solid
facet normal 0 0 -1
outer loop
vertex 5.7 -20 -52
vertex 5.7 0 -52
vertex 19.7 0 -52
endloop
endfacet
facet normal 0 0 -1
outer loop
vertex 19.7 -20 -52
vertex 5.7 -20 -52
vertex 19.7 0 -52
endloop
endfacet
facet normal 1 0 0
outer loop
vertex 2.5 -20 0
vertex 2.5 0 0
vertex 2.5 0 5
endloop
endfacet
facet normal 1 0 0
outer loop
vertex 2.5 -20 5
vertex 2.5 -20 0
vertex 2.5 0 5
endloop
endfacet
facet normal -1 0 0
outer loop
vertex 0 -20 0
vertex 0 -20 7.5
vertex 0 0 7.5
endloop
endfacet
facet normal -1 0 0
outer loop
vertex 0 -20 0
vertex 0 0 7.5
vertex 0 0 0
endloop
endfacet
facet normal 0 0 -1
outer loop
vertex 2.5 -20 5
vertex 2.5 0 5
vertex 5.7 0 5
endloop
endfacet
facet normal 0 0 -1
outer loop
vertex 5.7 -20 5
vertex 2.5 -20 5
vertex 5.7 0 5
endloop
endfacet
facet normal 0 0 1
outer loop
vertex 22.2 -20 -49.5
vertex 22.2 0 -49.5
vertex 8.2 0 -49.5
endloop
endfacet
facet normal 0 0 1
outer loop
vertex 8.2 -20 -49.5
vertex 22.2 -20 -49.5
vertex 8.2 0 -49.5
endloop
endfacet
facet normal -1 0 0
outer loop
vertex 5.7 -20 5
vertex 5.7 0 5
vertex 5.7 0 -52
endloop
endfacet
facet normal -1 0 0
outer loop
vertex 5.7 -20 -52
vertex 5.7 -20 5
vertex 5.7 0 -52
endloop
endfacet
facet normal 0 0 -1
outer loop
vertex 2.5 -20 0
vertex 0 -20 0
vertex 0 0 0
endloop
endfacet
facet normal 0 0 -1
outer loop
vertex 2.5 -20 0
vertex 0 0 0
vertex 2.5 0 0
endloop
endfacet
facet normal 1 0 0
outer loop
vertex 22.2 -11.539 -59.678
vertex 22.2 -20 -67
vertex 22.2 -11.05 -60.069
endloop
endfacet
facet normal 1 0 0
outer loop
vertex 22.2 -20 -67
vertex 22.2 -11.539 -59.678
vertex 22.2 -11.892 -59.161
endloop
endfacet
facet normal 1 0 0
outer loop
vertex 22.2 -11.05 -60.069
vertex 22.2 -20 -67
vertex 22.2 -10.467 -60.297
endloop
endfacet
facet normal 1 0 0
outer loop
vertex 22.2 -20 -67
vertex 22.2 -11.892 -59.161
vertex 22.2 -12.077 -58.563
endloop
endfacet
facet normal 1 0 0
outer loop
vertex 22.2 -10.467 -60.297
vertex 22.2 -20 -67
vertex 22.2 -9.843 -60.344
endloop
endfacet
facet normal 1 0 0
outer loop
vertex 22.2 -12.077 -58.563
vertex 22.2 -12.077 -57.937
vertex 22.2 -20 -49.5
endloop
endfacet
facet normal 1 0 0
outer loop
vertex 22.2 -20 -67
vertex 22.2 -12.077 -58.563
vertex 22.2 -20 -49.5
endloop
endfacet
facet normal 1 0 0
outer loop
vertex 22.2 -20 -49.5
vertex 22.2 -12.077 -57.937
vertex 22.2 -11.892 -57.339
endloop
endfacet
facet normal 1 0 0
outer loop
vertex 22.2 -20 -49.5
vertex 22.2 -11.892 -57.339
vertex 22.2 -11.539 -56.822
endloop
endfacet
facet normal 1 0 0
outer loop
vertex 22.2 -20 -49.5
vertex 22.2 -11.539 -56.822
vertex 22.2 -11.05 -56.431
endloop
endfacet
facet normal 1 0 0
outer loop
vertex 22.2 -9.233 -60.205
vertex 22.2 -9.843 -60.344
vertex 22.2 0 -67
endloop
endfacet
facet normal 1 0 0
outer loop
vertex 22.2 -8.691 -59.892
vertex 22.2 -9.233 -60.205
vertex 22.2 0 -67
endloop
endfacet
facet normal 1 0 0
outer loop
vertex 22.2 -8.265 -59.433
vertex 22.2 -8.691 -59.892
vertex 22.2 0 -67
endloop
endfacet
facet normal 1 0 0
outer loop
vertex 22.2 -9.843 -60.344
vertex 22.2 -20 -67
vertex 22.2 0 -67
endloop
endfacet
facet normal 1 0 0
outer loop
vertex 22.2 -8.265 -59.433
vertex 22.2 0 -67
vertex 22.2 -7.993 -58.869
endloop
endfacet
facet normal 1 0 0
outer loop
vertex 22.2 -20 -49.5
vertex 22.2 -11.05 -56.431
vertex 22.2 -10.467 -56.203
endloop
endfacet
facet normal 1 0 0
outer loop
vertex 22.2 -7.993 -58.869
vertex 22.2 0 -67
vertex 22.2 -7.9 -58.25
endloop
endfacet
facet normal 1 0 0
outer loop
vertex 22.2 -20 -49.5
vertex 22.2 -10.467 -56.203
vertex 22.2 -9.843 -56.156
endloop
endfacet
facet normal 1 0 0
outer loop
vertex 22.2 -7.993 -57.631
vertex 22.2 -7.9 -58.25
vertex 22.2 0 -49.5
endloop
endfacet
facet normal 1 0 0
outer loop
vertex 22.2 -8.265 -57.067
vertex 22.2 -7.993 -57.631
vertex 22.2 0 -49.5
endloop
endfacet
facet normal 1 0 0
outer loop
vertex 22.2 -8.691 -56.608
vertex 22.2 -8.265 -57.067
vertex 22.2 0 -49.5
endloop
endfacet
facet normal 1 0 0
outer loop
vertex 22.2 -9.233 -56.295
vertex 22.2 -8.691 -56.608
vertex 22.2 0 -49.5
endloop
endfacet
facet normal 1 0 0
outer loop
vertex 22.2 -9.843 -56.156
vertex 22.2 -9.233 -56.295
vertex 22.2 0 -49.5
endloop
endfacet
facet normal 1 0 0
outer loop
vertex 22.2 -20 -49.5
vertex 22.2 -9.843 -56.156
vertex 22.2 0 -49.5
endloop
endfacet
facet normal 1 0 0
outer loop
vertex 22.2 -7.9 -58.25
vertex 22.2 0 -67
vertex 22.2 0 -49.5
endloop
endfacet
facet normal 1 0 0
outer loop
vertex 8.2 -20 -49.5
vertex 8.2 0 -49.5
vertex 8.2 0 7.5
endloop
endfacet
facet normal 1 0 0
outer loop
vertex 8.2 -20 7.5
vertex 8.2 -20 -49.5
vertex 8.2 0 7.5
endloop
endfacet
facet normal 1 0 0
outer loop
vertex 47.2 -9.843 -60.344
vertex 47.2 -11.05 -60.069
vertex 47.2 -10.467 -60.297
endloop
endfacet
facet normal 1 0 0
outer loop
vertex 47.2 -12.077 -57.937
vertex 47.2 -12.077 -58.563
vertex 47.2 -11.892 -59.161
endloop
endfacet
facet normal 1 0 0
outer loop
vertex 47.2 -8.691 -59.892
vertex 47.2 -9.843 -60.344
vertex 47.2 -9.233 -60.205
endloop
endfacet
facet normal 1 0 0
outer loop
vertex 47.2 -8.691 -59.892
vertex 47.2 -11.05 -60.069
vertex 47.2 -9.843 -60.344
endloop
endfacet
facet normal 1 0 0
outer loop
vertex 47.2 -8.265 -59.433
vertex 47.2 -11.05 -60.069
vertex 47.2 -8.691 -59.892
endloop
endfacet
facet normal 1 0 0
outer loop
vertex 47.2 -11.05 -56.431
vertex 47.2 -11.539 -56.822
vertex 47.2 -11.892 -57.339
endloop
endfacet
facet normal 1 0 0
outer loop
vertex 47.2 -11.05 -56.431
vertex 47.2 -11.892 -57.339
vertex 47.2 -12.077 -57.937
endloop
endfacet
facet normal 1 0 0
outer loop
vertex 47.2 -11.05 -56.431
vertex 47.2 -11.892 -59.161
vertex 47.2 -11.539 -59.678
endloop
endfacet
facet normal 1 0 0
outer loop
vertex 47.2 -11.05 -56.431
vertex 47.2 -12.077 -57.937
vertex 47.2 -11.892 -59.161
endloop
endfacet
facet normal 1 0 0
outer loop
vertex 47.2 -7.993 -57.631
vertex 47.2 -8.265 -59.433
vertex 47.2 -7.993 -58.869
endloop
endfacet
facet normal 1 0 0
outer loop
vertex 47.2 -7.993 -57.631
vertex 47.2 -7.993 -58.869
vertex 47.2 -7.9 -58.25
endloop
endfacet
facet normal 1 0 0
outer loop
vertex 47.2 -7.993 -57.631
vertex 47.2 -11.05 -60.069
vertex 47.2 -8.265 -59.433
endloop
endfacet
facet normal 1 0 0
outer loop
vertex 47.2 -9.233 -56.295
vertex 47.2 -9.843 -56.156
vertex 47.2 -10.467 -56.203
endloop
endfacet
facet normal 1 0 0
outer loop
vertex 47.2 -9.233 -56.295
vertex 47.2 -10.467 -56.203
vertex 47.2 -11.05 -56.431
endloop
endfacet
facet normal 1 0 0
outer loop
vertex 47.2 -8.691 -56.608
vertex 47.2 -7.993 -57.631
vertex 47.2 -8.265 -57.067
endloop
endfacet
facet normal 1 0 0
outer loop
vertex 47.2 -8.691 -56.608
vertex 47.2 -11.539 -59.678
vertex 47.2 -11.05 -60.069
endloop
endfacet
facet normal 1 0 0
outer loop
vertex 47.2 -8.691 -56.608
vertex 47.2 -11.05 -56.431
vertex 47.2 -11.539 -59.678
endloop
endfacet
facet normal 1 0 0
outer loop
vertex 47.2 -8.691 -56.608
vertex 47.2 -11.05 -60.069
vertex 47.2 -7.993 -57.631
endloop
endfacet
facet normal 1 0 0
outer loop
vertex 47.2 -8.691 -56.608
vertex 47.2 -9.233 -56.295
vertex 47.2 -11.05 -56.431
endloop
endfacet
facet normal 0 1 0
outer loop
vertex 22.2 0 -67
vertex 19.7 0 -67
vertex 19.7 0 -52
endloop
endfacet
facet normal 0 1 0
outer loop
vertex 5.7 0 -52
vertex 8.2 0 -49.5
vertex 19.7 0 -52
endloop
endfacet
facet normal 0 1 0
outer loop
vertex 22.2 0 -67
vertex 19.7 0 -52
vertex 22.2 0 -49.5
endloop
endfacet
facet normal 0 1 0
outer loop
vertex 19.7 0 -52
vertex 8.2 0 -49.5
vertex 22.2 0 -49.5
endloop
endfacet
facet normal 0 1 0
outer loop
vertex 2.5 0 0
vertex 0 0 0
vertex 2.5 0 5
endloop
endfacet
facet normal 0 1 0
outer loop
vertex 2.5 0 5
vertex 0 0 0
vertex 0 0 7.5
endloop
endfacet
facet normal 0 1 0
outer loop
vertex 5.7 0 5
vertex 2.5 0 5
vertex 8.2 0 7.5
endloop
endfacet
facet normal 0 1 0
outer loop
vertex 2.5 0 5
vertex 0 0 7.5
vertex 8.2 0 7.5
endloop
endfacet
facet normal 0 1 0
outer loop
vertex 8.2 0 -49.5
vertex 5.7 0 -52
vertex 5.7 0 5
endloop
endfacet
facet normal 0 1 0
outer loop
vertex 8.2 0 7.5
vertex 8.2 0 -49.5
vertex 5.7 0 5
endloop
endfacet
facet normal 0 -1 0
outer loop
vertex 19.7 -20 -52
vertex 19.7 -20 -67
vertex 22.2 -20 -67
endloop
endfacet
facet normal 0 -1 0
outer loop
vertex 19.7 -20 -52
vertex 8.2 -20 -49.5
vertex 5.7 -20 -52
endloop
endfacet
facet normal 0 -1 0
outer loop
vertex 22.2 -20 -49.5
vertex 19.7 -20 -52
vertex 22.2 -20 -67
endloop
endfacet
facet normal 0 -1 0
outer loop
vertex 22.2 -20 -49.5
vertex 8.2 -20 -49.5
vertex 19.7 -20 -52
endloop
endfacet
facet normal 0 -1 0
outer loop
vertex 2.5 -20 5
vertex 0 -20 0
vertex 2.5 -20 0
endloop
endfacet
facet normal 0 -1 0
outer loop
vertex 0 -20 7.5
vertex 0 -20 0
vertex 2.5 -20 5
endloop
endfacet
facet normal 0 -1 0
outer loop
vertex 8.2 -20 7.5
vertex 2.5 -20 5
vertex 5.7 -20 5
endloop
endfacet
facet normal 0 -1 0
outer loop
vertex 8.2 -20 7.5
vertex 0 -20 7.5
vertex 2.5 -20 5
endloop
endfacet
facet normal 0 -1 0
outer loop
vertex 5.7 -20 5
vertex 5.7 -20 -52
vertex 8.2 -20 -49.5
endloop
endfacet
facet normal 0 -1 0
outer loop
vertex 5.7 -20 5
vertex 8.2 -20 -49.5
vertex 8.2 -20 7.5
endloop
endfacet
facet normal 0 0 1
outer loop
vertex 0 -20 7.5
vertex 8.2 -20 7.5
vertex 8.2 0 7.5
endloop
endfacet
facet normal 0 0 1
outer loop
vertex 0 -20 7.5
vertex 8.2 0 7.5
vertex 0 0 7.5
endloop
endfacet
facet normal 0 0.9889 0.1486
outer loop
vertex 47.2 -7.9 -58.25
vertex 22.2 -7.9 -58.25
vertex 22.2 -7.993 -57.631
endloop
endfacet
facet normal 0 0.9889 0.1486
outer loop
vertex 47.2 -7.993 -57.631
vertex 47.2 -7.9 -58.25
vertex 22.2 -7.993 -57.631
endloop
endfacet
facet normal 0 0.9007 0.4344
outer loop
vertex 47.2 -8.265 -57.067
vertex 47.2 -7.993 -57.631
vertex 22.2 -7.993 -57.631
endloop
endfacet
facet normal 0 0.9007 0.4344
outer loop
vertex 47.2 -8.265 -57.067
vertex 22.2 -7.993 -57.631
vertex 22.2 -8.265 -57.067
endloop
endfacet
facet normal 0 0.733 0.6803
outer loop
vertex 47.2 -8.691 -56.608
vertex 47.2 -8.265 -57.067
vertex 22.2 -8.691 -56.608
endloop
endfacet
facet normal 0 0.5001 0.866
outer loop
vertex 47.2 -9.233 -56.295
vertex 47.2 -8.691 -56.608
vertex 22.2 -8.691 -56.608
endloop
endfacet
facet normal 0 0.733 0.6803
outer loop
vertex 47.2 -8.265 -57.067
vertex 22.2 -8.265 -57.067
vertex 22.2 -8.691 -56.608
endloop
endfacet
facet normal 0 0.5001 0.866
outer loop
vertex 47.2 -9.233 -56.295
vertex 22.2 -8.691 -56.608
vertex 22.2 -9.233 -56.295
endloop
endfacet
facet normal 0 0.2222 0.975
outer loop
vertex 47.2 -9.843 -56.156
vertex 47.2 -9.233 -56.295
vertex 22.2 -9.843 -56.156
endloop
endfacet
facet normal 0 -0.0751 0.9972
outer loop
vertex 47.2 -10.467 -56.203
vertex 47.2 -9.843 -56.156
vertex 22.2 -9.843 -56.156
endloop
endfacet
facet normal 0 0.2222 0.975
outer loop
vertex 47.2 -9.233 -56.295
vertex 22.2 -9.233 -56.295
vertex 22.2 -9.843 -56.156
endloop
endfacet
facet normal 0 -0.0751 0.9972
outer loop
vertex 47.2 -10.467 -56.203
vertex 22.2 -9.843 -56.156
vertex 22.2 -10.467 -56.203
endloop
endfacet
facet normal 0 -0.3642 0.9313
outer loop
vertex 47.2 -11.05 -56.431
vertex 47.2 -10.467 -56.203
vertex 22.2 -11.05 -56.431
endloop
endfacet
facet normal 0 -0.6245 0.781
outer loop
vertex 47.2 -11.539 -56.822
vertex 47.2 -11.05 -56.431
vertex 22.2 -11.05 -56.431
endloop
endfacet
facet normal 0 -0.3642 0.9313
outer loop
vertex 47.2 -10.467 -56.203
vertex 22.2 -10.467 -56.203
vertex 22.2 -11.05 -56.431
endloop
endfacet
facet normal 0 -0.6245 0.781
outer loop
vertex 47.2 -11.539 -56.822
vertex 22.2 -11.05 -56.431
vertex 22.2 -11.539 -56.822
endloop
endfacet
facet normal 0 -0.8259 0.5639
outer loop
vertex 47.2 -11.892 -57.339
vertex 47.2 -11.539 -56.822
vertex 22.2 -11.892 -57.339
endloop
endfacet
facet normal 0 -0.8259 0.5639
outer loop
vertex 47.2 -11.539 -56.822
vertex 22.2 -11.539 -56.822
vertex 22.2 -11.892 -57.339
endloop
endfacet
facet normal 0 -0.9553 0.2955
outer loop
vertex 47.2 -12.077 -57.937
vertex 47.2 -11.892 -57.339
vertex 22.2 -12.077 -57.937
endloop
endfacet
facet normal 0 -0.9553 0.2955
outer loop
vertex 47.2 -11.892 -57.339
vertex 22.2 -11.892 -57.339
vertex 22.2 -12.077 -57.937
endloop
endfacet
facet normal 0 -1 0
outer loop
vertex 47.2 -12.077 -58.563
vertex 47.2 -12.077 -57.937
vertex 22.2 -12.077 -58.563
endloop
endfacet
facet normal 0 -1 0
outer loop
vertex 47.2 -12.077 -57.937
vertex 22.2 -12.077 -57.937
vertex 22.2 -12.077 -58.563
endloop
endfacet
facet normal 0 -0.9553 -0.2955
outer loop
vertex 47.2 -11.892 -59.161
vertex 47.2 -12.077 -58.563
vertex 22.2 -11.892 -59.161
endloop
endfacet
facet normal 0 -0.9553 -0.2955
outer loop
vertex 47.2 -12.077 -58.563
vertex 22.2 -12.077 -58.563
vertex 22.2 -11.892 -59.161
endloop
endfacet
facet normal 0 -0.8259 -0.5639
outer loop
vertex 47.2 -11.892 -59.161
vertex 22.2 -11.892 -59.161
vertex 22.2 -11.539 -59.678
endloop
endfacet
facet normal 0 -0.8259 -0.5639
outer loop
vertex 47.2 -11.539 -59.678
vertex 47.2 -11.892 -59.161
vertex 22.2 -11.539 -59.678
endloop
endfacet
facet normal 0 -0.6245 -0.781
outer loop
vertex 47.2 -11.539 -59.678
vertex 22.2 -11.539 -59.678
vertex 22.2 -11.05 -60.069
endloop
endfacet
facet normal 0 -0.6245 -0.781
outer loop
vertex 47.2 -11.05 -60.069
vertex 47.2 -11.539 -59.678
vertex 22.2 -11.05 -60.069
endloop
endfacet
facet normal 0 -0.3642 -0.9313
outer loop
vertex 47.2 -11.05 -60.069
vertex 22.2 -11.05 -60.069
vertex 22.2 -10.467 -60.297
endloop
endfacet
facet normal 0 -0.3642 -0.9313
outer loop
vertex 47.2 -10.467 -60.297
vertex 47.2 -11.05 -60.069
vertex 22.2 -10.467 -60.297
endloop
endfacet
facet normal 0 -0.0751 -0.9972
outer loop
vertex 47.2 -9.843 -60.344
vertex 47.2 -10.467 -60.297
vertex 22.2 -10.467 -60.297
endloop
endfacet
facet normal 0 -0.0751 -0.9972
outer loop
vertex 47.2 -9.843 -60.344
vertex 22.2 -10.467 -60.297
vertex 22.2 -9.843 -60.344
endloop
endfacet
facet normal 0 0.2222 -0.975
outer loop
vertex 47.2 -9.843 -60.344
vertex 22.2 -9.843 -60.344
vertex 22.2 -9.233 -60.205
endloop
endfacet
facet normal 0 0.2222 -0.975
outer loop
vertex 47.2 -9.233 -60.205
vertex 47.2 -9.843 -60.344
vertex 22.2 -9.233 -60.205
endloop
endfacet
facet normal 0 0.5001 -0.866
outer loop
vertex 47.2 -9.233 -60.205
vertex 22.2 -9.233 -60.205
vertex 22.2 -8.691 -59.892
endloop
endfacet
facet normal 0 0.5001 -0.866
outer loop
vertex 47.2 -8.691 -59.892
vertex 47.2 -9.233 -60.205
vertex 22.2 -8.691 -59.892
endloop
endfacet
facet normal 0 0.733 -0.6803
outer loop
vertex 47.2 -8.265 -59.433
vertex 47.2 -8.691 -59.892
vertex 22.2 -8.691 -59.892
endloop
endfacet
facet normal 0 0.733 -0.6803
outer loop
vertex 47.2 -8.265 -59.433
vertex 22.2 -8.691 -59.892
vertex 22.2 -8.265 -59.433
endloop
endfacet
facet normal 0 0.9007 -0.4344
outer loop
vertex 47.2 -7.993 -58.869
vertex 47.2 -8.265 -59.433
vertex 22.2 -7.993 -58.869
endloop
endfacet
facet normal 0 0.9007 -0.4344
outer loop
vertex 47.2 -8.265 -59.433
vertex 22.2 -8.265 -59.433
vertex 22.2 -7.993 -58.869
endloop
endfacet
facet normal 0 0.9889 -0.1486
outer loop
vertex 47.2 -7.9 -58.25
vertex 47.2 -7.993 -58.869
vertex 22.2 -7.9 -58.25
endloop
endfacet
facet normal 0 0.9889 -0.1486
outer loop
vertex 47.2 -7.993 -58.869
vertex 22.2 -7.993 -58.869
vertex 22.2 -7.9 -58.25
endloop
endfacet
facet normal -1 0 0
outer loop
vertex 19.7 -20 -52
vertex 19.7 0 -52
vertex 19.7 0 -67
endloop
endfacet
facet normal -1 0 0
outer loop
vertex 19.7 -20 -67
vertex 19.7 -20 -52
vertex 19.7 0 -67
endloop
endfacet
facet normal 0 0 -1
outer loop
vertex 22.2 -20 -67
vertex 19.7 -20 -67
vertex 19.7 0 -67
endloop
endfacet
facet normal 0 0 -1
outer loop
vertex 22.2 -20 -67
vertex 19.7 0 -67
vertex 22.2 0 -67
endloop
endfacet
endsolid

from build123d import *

# Parameters (mm, degrees)
F1_DEPTH = 20
F2_R     = 2.1
F3_DEPTH = 25


with BuildPart() as f1:
    # F0 (on Front) → F1 (new body)
    with BuildSketch(Plane.XZ):
        Polygon((0, 7.5), (0, 0), (2.5, 0), (2.5, 5), (5.7, 5), (5.7, -52), (19.7, -52), (19.7, -67), (22.2, -67), (22.2, -49.5), (8.2, -49.5), (8.2, 7.5), align=None)
    extrude(amount=F1_DEPTH)

    # F2 (on face) → F3 (join)
    with BuildSketch(Plane.YZ.offset(22.2)):
        with Locations((-10, -58.25)):
            Circle(F2_R)
    extrude(amount=F3_DEPTH)


solid = f1.part
